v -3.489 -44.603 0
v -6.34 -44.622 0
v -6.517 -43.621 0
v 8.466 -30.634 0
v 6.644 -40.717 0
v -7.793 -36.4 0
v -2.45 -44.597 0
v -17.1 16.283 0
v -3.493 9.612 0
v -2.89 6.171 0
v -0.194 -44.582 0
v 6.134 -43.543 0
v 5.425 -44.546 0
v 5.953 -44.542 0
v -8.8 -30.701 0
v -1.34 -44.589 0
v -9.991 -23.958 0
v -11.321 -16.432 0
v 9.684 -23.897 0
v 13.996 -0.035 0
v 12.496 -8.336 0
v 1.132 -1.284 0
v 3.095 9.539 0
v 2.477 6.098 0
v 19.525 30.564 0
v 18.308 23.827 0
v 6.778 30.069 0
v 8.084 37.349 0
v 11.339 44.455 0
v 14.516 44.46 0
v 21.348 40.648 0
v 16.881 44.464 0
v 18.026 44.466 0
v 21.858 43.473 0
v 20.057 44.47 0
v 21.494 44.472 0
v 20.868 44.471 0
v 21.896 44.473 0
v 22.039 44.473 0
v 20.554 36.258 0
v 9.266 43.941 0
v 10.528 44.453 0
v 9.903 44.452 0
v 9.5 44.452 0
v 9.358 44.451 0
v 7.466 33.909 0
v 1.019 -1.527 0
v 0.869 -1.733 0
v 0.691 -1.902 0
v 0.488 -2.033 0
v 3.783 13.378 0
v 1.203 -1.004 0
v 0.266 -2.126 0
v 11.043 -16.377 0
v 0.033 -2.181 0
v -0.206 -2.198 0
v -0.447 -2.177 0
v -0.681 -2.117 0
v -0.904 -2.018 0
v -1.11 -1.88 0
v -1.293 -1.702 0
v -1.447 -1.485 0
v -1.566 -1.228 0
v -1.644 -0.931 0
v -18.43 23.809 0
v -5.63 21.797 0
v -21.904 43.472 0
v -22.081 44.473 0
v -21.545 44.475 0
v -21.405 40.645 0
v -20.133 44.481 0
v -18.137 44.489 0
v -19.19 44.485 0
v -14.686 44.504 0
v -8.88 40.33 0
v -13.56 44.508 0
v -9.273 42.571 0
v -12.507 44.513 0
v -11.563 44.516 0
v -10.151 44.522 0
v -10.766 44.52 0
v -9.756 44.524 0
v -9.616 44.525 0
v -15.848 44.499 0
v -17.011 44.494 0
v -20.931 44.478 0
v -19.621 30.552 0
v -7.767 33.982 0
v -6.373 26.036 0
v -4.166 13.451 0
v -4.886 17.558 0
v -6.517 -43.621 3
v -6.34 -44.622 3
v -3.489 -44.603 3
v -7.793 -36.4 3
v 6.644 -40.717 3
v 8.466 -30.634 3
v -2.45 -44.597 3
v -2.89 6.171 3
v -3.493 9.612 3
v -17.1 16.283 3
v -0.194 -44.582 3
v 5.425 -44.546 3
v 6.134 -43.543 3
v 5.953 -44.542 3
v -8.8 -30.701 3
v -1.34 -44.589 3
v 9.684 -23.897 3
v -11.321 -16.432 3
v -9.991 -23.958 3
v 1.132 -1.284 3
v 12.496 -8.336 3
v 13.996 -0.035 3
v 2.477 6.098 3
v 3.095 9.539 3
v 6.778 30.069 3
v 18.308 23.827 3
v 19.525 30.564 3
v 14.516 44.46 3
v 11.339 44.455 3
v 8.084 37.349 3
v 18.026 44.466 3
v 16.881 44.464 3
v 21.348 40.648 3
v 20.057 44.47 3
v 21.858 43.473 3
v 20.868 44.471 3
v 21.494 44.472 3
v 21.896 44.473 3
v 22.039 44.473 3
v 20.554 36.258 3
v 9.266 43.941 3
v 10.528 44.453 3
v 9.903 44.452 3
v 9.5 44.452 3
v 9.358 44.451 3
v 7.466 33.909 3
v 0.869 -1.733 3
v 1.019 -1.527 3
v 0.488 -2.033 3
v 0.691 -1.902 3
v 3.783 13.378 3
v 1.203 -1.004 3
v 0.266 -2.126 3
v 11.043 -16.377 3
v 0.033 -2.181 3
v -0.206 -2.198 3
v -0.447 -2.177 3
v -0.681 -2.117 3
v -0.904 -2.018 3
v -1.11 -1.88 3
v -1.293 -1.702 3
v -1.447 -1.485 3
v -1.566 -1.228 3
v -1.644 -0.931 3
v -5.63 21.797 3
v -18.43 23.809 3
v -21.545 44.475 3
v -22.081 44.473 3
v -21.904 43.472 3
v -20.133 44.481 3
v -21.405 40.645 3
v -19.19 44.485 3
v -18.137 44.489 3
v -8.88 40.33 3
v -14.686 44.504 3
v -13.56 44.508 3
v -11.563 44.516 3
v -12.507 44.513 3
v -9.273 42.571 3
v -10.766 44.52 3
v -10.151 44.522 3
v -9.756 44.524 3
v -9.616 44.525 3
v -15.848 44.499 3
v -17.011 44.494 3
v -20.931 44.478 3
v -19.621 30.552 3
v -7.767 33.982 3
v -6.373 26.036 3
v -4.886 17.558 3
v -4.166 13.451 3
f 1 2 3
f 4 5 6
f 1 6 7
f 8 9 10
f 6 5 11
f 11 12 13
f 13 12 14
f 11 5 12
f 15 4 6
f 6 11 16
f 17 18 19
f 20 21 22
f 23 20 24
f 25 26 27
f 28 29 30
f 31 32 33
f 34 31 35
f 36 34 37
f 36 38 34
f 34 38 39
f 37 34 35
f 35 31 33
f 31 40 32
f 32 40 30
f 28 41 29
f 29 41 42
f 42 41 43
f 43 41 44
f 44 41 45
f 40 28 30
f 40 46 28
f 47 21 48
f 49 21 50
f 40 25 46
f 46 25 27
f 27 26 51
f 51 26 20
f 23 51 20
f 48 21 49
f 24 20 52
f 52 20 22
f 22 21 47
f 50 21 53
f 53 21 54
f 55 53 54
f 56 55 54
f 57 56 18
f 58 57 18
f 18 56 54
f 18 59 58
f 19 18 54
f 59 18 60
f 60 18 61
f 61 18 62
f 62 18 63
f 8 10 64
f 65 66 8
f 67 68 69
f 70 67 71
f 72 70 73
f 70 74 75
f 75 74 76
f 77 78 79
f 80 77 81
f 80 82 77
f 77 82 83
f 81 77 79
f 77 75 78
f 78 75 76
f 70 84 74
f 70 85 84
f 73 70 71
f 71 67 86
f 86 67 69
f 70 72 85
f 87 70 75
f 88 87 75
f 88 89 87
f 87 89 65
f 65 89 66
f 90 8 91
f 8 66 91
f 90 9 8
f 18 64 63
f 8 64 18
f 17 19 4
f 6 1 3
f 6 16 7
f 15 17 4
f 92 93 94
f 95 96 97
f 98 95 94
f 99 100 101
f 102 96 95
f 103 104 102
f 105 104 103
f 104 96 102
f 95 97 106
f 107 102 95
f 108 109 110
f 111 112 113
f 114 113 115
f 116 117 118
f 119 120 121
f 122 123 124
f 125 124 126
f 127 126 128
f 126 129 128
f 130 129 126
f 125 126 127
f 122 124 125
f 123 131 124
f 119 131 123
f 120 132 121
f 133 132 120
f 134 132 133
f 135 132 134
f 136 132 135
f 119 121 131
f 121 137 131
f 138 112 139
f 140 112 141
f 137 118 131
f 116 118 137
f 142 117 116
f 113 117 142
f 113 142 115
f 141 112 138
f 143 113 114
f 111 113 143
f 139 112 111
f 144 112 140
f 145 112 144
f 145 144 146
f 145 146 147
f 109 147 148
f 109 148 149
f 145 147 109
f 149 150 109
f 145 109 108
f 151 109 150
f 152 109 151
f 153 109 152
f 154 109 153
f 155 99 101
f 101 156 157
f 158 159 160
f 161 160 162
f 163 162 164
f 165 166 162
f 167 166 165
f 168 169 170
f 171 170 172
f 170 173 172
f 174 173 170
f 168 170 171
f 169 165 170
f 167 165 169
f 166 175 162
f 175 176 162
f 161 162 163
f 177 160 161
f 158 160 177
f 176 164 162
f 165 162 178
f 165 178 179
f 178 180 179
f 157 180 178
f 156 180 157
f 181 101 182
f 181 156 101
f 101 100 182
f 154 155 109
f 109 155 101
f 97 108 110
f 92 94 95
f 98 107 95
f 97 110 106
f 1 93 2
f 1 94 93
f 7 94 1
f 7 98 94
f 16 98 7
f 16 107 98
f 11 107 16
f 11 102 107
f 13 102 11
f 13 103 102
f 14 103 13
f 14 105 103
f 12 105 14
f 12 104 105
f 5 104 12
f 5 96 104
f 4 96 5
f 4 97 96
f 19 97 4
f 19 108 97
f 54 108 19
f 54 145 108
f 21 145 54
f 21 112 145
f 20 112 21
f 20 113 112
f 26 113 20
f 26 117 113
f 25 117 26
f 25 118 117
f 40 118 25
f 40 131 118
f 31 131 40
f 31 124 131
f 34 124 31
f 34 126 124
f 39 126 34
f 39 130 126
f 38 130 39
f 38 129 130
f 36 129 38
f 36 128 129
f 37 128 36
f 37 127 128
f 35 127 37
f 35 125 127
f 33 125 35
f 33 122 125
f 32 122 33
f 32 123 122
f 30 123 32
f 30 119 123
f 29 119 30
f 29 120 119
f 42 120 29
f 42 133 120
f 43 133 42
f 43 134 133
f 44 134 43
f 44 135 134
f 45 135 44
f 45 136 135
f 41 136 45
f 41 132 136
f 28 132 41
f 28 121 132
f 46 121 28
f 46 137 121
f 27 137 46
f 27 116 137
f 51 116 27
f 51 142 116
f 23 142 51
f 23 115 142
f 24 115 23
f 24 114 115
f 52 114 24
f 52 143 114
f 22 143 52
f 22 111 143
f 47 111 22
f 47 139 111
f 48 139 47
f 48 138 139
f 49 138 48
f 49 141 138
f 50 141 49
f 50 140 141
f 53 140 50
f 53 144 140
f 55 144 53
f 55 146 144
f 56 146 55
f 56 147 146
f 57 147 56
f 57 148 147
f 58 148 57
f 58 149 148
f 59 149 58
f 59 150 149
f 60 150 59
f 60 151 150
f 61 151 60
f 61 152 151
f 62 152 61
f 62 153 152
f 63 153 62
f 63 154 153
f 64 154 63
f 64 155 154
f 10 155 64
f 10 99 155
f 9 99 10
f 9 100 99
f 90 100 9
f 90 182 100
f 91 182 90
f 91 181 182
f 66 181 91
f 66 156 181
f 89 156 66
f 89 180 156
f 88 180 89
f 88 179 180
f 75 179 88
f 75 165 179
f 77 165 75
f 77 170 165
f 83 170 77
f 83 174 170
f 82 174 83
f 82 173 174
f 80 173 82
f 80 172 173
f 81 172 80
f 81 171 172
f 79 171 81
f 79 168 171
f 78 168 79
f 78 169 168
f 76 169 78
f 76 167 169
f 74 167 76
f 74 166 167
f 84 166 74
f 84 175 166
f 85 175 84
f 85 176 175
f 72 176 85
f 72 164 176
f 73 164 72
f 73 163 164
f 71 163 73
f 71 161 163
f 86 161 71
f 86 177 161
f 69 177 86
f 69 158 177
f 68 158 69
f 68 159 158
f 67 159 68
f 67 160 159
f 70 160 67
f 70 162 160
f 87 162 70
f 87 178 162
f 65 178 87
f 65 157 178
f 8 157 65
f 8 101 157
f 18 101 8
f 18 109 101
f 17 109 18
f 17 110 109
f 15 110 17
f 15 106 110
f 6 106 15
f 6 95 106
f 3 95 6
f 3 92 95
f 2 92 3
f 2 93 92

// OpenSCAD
// Generated from 交通部公路局（原交通部公路總局）「新式號牌使用之英文字、數字字體」author trace
fudge = 0.1;

module glyph_2012_V(h = 3) {
  difference() {
    linear_extrude(height = h)
      polygon(points = [[-22.0809, 44.4728], [-21.9041, 43.4723], [-21.4046, 40.6446], [-20.6283, 36.2507], [-19.6214, 30.5518], [-18.4301, 23.8088], [-17.1004, 16.2827], [-15.6785, 8.2346], [-14.2105, -0.0745], [-12.7425, -8.3836], [-11.3206, -16.4317], [-9.991, -23.9577], [-8.7996, -30.7008], [-7.7928, -36.3997], [-7.0165, -40.7935], [-6.5169, -43.6212], [-6.3402, -44.6218], [-6.2021, -44.6209], [-5.8119, -44.6184], [-5.2057, -44.6145], [-4.4194, -44.6094], [-3.489, -44.6034], [-2.4505, -44.5966], [-1.3401, -44.5895], [-0.1936, -44.582], [0.9529, -44.5746], [2.0633, -44.5674], [3.1018, -44.5607], [4.0321, -44.5547], [4.8185, -44.5496], [5.4247, -44.5457], [5.8149, -44.5432], [5.9529, -44.5423], [6.1336, -43.5426], [6.6441, -40.7174], [7.4374, -36.3275], [8.4663, -30.6337], [9.6838, -23.8967], [11.0426, -16.3773], [12.4957, -8.3364], [13.9958, -0.0347], [15.496, 8.267], [16.9491, 16.308], [18.3079, 23.8273], [19.5254, 30.5643], [20.5543, 36.2582], [21.3476, 40.6481], [21.8581, 43.4733], [22.0388, 44.4729], [21.8964, 44.4727], [21.4939, 44.472], [20.8685, 44.471], [20.0574, 44.4696], [19.0976, 44.468], [18.0264, 44.4662], [16.8809, 44.4642], [15.6983, 44.4622], [14.5156, 44.4602], [13.3701, 44.4583], [12.2989, 44.4565], [11.3392, 44.4549], [10.528, 44.4535], [9.9027, 44.4525], [9.5002, 44.4518], [9.3578, 44.4515], [9.2662, 43.9411], [9.0074, 42.4984], [8.6052, 40.2567], [8.0836, 37.3491], [7.4665, 33.9089], [6.7776, 30.0691], [6.041, 25.963], [5.2805, 21.7237], [4.52, 17.4845], [3.7834, 13.3784], [3.0946, 9.5386], [2.4774, 6.0984], [1.9558, 3.1908], [1.5537, 0.9491], [1.2949, -0.4936], [1.2033, -1.0041], [1.1318, -1.284], [1.0186, -1.527], [0.8695, -1.733], [0.6906, -1.9016], [0.4876, -2.0327], [0.2665, -2.126], [0.0332, -2.1813], [-0.2065, -2.1984], [-0.4466, -2.177], [-0.6812, -2.1169], [-0.9045, -2.0179], [-1.1105, -1.8797], [-1.2934, -1.7022], [-1.4472, -1.485], [-1.5661, -1.228], [-1.6441, -0.931], [-1.7336, -0.4205], [-1.9866, 1.0222], [-2.3797, 3.2639], [-2.8896, 6.1715], [-3.493, 9.6117], [-4.1663, 13.4515], [-4.8864, 17.5576], [-5.6299, 21.7968], [-6.3733, 26.0361], [-7.0934, 30.1422], [-7.7668, 33.982], [-8.3701, 37.4222], [-8.88, 40.3298], [-9.2732, 42.5715], [-9.5262, 44.0142], [-9.6157, 44.5246], [-9.7557, 44.5241], [-10.1513, 44.5224], [-10.766, 44.5199], [-11.5634, 44.5165], [-12.5068, 44.5126], [-13.5598, 44.5083], [-14.6858, 44.5036], [-15.8483, 44.4987], [-17.0108, 44.4939], [-18.1368, 44.4892], [-19.1898, 44.4849], [-20.1332, 44.4809], [-20.9306, 44.4776], [-21.5453, 44.4751], [-21.9409, 44.4734]]);
  }
}

glyph_2012_V();
